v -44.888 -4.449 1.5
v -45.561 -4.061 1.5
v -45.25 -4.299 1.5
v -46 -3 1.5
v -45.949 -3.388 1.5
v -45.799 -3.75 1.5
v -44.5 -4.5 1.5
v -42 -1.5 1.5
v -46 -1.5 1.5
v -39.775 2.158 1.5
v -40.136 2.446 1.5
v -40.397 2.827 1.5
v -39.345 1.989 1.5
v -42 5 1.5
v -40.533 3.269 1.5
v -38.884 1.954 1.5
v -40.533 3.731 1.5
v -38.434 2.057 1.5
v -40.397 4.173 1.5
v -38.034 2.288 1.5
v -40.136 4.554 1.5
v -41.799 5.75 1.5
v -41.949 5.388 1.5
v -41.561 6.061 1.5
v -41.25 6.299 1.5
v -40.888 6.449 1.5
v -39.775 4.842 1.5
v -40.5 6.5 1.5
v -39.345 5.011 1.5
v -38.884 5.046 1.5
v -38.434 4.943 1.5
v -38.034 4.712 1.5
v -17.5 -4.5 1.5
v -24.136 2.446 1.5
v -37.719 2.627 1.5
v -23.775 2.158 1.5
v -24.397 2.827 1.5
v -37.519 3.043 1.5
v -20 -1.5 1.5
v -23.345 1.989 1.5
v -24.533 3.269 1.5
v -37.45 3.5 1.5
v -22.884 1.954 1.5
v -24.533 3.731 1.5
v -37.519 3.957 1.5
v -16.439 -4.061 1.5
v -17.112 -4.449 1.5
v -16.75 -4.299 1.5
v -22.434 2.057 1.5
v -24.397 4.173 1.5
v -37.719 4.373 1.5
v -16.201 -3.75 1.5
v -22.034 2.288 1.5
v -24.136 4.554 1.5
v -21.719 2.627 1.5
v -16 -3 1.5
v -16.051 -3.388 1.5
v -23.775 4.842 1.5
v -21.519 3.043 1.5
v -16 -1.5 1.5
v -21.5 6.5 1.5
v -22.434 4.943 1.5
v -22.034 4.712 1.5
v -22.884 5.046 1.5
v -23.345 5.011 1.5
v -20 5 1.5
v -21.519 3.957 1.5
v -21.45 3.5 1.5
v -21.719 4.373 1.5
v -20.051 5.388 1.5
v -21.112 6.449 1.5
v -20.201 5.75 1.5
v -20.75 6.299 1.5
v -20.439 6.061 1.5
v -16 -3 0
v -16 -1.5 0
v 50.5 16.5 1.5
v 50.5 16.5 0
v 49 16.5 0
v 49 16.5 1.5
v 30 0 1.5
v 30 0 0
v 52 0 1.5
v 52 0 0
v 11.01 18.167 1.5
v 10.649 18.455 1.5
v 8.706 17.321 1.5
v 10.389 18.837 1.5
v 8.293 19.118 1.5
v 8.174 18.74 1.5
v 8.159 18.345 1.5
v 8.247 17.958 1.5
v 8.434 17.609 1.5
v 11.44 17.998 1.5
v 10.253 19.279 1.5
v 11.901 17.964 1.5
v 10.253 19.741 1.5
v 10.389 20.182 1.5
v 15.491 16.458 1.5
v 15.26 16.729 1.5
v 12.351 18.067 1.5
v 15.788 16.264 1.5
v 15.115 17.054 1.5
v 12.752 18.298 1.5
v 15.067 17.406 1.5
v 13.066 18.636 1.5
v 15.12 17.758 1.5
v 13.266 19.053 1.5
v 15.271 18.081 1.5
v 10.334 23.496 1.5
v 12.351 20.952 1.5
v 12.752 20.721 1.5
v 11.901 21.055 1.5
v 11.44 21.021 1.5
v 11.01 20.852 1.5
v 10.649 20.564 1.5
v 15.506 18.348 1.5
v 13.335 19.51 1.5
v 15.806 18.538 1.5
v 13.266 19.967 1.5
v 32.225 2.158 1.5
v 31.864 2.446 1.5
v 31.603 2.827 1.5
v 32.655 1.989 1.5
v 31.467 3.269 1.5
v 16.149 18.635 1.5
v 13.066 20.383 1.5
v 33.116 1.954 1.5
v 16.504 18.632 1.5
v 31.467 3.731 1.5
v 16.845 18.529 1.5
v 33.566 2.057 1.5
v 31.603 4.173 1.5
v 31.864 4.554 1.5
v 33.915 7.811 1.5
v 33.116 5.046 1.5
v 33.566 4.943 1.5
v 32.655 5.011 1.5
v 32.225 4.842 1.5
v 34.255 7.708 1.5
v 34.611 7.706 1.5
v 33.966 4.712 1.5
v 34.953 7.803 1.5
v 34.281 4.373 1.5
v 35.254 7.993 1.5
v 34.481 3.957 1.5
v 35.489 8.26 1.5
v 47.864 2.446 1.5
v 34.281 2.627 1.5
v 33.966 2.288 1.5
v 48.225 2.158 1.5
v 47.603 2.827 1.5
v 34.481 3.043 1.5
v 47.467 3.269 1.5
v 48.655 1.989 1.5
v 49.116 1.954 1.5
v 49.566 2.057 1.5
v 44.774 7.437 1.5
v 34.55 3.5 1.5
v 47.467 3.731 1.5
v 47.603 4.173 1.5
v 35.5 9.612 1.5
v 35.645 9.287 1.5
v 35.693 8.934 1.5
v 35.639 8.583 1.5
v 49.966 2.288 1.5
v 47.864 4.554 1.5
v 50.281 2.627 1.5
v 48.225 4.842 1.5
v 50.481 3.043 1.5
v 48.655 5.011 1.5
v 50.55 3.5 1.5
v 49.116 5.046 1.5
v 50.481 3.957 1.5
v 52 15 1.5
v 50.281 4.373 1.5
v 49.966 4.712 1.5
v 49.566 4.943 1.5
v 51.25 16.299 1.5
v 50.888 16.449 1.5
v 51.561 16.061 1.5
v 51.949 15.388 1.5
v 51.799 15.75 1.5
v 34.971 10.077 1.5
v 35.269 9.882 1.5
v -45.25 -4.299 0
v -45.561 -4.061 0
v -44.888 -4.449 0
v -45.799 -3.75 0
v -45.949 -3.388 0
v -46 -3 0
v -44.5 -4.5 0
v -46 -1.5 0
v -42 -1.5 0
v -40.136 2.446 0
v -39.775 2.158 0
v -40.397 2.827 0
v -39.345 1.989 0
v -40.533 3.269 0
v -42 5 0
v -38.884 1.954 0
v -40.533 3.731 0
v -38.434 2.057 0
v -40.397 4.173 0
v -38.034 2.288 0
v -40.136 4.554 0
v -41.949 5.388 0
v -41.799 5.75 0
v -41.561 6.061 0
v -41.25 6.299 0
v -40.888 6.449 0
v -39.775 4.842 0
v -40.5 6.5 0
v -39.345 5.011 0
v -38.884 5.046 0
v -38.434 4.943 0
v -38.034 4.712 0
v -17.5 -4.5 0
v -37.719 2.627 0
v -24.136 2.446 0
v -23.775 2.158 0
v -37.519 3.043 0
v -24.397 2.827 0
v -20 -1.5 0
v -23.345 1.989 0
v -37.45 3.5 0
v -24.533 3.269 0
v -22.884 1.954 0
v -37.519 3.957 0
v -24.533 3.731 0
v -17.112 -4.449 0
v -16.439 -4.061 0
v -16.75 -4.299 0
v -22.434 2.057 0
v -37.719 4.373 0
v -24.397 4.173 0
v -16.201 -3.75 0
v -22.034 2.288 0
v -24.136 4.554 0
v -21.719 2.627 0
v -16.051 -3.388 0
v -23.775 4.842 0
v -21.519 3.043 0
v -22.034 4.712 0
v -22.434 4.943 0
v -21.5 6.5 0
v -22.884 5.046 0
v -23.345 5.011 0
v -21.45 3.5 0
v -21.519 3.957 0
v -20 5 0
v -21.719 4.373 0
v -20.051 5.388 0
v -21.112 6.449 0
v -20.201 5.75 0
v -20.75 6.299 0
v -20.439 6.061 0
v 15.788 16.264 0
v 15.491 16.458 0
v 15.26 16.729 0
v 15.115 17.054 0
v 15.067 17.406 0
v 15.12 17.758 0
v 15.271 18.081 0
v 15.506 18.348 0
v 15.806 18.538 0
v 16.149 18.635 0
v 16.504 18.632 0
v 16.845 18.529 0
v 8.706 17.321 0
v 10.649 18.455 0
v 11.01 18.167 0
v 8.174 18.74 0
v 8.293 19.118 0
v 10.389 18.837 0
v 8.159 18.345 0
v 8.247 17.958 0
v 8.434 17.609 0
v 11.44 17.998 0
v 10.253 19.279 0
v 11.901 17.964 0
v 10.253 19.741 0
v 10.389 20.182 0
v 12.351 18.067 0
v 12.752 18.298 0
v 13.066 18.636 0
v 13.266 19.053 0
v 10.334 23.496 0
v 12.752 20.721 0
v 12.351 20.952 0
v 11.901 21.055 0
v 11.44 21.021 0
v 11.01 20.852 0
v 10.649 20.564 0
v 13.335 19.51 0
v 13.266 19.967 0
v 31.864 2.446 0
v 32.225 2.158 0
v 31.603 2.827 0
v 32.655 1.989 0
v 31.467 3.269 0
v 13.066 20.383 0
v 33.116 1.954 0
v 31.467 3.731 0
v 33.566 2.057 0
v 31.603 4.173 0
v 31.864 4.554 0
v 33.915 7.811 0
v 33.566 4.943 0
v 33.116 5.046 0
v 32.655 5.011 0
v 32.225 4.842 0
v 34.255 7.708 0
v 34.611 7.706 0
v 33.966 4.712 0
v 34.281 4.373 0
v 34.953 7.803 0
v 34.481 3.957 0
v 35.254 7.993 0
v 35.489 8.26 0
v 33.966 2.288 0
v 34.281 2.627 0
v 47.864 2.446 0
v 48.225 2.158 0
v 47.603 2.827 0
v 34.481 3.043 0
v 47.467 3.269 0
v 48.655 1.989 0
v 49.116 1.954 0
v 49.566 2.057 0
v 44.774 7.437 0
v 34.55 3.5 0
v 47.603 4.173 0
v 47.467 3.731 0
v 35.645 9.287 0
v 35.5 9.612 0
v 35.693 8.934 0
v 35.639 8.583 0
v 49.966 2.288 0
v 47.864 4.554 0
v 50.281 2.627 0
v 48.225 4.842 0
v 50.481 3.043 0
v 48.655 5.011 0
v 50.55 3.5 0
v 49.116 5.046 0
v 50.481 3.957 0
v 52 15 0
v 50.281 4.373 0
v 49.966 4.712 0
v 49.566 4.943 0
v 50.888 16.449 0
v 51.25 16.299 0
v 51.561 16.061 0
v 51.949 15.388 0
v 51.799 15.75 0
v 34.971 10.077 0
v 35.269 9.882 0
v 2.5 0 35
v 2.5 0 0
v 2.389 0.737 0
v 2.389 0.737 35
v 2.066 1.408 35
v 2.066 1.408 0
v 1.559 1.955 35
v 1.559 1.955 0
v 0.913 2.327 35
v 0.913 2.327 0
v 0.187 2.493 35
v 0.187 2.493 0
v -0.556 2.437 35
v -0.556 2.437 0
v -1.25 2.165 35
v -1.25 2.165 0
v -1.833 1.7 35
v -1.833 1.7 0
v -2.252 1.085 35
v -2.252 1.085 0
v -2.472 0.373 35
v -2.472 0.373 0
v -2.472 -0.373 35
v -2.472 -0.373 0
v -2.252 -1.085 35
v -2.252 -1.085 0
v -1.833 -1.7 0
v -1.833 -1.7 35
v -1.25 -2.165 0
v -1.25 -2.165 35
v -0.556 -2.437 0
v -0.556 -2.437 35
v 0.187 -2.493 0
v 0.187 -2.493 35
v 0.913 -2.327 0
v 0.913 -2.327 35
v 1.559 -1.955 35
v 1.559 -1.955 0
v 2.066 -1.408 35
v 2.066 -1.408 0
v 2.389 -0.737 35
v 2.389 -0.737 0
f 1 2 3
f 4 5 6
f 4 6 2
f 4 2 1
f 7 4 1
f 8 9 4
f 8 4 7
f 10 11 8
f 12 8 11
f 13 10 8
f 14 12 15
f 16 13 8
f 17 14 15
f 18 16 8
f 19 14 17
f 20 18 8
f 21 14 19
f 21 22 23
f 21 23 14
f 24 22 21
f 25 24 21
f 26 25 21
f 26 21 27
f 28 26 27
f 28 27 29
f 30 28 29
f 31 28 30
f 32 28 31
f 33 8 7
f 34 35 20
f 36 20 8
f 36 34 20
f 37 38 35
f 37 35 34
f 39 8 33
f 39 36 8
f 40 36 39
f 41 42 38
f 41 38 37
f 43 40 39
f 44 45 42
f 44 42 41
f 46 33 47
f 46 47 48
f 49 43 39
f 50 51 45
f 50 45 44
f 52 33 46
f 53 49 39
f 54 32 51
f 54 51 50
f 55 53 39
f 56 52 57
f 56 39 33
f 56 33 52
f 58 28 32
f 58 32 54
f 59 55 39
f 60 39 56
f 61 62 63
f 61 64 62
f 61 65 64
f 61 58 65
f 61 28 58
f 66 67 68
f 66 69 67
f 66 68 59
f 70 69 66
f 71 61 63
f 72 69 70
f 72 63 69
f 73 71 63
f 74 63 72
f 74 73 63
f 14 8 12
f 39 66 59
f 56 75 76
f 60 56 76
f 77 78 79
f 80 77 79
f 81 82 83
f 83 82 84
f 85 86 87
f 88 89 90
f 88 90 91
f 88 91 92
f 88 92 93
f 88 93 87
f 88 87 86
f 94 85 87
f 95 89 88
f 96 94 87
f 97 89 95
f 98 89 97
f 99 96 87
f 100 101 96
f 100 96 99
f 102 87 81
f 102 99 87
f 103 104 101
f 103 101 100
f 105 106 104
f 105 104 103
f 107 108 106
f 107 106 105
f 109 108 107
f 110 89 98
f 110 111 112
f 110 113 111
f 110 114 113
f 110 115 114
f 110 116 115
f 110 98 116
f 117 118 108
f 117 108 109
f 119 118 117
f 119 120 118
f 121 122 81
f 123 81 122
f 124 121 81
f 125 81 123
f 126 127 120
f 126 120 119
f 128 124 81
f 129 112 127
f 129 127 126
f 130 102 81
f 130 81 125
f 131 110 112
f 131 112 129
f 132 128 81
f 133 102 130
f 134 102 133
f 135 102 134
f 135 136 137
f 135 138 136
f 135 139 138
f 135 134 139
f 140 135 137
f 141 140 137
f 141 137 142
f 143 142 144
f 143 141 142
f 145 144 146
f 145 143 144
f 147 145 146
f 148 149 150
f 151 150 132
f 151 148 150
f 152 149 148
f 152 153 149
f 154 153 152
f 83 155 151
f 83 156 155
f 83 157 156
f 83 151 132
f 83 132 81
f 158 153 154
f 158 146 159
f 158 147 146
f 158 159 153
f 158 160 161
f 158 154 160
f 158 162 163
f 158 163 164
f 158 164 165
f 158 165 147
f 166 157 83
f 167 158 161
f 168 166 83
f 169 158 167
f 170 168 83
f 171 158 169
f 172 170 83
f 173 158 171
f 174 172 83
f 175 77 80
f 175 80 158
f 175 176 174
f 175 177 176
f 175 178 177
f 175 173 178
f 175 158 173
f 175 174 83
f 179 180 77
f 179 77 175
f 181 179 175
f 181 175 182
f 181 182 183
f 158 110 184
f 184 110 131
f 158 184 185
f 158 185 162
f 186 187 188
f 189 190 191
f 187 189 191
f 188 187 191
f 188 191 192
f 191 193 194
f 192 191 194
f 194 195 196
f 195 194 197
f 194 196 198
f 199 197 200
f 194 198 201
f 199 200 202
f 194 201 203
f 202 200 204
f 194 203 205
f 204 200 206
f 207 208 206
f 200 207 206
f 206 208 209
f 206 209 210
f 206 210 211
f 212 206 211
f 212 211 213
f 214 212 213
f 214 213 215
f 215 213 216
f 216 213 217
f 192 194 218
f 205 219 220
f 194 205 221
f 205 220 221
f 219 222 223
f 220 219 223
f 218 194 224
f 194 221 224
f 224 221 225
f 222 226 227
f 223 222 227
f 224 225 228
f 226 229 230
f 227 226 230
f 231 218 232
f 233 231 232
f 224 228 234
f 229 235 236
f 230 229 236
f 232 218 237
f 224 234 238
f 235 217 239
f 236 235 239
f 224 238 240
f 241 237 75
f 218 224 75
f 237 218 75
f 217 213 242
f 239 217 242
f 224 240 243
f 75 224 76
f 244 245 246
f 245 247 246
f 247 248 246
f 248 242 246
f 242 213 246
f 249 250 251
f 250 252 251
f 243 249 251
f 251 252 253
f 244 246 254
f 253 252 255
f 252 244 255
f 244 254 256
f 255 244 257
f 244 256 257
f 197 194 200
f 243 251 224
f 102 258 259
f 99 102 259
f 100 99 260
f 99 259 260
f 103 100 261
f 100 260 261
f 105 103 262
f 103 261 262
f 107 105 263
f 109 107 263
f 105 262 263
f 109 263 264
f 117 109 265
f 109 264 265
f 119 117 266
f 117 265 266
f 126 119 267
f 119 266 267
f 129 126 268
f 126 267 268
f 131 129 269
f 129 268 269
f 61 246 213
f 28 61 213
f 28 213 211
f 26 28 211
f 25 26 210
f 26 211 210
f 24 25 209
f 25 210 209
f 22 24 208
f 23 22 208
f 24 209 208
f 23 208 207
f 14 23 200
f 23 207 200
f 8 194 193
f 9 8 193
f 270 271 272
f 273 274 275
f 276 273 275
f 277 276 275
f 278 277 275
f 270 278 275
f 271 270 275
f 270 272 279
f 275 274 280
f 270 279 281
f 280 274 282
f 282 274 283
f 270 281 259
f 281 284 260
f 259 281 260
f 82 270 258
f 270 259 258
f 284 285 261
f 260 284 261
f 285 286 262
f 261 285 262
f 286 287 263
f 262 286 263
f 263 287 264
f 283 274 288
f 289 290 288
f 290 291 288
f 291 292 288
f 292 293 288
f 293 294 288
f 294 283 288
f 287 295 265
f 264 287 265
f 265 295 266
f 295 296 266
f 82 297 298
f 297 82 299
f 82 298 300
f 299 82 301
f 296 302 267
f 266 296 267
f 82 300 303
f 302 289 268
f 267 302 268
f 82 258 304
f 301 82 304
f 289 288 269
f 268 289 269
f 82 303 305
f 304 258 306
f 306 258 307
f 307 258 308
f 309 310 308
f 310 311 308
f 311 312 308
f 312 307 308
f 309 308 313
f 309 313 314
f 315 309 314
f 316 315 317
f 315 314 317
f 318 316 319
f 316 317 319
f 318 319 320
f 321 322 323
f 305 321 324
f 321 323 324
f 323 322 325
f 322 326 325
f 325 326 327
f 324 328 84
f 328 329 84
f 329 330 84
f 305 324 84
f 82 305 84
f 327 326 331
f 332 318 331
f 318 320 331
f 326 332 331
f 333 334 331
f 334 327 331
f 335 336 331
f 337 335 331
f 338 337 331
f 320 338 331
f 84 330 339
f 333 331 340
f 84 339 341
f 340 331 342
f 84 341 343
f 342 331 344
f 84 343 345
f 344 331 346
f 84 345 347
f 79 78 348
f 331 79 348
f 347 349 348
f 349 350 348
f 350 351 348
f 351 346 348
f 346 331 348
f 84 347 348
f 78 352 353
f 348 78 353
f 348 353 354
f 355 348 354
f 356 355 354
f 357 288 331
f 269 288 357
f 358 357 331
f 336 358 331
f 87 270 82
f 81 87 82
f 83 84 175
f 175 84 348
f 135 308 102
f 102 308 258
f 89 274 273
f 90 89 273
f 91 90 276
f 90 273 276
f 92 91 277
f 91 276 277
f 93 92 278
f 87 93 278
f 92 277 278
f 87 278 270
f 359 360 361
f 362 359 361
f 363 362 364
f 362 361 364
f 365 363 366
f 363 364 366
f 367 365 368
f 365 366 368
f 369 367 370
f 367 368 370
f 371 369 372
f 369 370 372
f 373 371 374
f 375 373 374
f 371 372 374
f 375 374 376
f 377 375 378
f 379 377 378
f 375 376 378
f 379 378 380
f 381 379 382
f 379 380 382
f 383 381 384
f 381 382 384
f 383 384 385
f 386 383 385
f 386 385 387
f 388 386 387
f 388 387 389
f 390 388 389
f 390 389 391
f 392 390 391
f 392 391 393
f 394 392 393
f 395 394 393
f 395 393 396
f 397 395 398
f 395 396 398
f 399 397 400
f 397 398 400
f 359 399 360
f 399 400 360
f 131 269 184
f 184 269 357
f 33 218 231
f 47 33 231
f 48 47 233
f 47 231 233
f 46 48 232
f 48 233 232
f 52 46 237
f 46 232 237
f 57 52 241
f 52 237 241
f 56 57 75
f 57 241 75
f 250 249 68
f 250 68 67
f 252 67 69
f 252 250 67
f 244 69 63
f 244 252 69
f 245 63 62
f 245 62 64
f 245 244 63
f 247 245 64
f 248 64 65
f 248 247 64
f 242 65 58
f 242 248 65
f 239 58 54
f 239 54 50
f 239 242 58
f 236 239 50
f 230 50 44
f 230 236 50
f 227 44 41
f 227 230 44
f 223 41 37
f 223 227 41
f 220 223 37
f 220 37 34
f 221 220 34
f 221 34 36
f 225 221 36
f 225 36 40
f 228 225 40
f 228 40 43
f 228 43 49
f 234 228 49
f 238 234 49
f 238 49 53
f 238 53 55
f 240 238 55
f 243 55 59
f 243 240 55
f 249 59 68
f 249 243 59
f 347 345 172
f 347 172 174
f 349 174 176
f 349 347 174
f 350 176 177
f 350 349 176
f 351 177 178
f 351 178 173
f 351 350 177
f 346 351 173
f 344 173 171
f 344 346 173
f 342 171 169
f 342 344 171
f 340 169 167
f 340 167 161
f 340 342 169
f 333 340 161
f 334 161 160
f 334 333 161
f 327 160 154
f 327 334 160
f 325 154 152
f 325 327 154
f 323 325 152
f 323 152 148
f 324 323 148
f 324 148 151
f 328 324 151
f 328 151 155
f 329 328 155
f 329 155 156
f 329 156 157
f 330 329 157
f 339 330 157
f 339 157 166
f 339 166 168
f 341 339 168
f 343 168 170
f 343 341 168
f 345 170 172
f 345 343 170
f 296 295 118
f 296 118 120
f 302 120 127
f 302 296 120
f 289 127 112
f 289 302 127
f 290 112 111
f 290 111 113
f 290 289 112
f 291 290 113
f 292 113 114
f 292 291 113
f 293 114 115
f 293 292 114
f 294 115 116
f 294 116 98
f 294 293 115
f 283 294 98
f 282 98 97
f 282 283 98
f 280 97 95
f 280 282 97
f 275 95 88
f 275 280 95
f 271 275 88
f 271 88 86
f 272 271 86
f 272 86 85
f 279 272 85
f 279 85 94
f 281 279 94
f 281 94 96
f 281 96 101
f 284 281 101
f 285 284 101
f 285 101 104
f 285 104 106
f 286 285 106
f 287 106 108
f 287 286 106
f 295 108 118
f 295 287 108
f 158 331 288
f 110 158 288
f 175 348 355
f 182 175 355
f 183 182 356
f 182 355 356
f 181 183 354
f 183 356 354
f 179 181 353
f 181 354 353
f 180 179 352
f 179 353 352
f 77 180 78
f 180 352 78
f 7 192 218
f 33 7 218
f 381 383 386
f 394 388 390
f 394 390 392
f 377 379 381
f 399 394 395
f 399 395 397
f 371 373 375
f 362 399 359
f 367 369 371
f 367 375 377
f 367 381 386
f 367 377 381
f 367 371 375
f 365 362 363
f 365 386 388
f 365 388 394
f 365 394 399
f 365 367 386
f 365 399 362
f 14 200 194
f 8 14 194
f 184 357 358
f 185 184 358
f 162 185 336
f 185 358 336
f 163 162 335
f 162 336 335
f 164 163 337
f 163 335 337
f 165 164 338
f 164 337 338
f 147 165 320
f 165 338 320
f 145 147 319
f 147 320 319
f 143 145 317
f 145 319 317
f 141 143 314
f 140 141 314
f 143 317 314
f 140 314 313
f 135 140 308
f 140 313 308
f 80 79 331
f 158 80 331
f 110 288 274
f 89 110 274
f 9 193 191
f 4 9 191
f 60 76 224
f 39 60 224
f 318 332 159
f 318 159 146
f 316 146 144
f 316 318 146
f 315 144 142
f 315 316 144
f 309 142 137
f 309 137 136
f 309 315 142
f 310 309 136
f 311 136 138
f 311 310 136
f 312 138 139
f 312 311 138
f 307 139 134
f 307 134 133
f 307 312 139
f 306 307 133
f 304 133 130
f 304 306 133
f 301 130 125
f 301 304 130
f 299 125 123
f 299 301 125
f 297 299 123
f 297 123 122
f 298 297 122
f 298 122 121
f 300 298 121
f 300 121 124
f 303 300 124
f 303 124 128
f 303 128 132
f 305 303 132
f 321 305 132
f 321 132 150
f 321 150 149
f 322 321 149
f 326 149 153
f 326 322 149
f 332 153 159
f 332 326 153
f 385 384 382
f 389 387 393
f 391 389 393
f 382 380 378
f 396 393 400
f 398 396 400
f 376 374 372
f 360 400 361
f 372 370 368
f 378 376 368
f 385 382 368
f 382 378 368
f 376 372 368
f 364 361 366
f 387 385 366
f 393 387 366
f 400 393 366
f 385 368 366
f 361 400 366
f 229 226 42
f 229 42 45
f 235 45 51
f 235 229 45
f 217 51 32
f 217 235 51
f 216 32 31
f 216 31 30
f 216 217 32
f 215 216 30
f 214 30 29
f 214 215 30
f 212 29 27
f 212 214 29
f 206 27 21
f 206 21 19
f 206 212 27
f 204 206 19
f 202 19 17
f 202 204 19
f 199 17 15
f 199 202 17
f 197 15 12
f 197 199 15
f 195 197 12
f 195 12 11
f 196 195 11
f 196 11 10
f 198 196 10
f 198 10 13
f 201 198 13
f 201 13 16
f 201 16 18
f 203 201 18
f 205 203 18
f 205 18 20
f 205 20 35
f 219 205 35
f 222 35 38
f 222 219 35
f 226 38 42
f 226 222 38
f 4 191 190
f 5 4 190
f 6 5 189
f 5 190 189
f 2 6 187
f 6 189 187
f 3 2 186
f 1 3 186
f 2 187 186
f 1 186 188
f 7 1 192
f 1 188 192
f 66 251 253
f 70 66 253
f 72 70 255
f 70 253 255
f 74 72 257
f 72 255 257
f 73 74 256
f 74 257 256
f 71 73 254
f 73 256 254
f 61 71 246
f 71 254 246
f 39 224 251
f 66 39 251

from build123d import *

# Parameters (mm, degrees)
F0_R     = 1.55
F1_DEPTH = 1.5
F2_R     = 1.55
F3_DEPTH = 1.5
F4_R     = 2.5
F5_DEPTH = 35


with BuildPart() as f1:
    # F0 (on Top) → F1 (new body)
    with BuildSketch(Plane.XY):
        with BuildLine():
            Line((-42, 5), (-42, 0))
            Line((-42, 0), (-42, -1.5))
            Line((-42, -1.5), (-46, -1.5))
            Line((-46, -1.5), (-46, -3))
            ThreePointArc((-46, -3), (-45.56066, -4.06066), (-44.5, -4.5))
            Line((-44.5, -4.5), (-17.5, -4.5))
            ThreePointArc((-17.5, -4.5), (-16.43934, -4.06066), (-16, -3))
            Line((-16, -3), (-16, -1.5))
            Line((-16, -1.5), (-20, -1.5))
            Line((-20, -1.5), (-20, 0))
            Line((-20, 0), (-20, 5))
            ThreePointArc((-20, 5), (-20.43934, 6.06066), (-21.5, 6.5))
            Line((-21.5, 6.5), (-40.5, 6.5))
            ThreePointArc((-40.5, 6.5), (-41.56066, 6.06066), (-42, 5))
        make_face()
        with Locations((-39, 3.5)):
            Circle(F0_R, mode=Mode.SUBTRACT)
        with Locations((-23, 3.5)):
            Circle(F0_R, mode=Mode.SUBTRACT)
    extrude(amount=F1_DEPTH)


with BuildPart() as f3:
    # F2 (on Top) → F3 (new body)
    with BuildSketch(Plane.XY):
        with BuildLine():
            Line((44.773817, 7.436922), (10.334121, 23.496416))
            Line((10.334121, 23.496416), (8.292581, 19.118319))
            ThreePointArc((8.292581, 19.118319), (8.190122, 18.148554), (8.70553, 17.320728))
            Line((8.70553, 17.320728), (30, 0))
            Line((30, 0), (52, 0))
            Line((52, 0), (52, 15))
            ThreePointArc((52, 15), (51.56066, 16.06066), (50.5, 16.5))
            Line((50.5, 16.5), (49, 16.5))
            Line((49, 16.5), (44.773817, 7.436922))
        make_face()
        with Locations((33, 3.5)):
            Circle(F2_R, mode=Mode.SUBTRACT)
        with Locations((49, 3.5)):
            Circle(F2_R, mode=Mode.SUBTRACT)
        with BuildLine():
            ThreePointArc((15.788456, 16.263662), (15.183844, 17.924819), (16.845002, 18.529431))
            Line((16.845002, 18.529431), (34.971158, 10.077066))
            ThreePointArc((34.971158, 10.077066), (35.575769, 8.415909), (33.914612, 7.811297))
            Line((33.914612, 7.811297), (15.788456, 16.263662))
        make_face(mode=Mode.SUBTRACT)
        with Locations((11.78519, 19.509638)):
            Circle(F2_R, mode=Mode.SUBTRACT)
    extrude(amount=F3_DEPTH)


with BuildPart() as f5:
    # F4 (on Top) → F5 (new body)
    with BuildSketch(Plane.XY):
        Circle(F4_R)
    extrude(amount=F5_DEPTH)


solid = Compound([f1.part, f3.part, f5.part])
